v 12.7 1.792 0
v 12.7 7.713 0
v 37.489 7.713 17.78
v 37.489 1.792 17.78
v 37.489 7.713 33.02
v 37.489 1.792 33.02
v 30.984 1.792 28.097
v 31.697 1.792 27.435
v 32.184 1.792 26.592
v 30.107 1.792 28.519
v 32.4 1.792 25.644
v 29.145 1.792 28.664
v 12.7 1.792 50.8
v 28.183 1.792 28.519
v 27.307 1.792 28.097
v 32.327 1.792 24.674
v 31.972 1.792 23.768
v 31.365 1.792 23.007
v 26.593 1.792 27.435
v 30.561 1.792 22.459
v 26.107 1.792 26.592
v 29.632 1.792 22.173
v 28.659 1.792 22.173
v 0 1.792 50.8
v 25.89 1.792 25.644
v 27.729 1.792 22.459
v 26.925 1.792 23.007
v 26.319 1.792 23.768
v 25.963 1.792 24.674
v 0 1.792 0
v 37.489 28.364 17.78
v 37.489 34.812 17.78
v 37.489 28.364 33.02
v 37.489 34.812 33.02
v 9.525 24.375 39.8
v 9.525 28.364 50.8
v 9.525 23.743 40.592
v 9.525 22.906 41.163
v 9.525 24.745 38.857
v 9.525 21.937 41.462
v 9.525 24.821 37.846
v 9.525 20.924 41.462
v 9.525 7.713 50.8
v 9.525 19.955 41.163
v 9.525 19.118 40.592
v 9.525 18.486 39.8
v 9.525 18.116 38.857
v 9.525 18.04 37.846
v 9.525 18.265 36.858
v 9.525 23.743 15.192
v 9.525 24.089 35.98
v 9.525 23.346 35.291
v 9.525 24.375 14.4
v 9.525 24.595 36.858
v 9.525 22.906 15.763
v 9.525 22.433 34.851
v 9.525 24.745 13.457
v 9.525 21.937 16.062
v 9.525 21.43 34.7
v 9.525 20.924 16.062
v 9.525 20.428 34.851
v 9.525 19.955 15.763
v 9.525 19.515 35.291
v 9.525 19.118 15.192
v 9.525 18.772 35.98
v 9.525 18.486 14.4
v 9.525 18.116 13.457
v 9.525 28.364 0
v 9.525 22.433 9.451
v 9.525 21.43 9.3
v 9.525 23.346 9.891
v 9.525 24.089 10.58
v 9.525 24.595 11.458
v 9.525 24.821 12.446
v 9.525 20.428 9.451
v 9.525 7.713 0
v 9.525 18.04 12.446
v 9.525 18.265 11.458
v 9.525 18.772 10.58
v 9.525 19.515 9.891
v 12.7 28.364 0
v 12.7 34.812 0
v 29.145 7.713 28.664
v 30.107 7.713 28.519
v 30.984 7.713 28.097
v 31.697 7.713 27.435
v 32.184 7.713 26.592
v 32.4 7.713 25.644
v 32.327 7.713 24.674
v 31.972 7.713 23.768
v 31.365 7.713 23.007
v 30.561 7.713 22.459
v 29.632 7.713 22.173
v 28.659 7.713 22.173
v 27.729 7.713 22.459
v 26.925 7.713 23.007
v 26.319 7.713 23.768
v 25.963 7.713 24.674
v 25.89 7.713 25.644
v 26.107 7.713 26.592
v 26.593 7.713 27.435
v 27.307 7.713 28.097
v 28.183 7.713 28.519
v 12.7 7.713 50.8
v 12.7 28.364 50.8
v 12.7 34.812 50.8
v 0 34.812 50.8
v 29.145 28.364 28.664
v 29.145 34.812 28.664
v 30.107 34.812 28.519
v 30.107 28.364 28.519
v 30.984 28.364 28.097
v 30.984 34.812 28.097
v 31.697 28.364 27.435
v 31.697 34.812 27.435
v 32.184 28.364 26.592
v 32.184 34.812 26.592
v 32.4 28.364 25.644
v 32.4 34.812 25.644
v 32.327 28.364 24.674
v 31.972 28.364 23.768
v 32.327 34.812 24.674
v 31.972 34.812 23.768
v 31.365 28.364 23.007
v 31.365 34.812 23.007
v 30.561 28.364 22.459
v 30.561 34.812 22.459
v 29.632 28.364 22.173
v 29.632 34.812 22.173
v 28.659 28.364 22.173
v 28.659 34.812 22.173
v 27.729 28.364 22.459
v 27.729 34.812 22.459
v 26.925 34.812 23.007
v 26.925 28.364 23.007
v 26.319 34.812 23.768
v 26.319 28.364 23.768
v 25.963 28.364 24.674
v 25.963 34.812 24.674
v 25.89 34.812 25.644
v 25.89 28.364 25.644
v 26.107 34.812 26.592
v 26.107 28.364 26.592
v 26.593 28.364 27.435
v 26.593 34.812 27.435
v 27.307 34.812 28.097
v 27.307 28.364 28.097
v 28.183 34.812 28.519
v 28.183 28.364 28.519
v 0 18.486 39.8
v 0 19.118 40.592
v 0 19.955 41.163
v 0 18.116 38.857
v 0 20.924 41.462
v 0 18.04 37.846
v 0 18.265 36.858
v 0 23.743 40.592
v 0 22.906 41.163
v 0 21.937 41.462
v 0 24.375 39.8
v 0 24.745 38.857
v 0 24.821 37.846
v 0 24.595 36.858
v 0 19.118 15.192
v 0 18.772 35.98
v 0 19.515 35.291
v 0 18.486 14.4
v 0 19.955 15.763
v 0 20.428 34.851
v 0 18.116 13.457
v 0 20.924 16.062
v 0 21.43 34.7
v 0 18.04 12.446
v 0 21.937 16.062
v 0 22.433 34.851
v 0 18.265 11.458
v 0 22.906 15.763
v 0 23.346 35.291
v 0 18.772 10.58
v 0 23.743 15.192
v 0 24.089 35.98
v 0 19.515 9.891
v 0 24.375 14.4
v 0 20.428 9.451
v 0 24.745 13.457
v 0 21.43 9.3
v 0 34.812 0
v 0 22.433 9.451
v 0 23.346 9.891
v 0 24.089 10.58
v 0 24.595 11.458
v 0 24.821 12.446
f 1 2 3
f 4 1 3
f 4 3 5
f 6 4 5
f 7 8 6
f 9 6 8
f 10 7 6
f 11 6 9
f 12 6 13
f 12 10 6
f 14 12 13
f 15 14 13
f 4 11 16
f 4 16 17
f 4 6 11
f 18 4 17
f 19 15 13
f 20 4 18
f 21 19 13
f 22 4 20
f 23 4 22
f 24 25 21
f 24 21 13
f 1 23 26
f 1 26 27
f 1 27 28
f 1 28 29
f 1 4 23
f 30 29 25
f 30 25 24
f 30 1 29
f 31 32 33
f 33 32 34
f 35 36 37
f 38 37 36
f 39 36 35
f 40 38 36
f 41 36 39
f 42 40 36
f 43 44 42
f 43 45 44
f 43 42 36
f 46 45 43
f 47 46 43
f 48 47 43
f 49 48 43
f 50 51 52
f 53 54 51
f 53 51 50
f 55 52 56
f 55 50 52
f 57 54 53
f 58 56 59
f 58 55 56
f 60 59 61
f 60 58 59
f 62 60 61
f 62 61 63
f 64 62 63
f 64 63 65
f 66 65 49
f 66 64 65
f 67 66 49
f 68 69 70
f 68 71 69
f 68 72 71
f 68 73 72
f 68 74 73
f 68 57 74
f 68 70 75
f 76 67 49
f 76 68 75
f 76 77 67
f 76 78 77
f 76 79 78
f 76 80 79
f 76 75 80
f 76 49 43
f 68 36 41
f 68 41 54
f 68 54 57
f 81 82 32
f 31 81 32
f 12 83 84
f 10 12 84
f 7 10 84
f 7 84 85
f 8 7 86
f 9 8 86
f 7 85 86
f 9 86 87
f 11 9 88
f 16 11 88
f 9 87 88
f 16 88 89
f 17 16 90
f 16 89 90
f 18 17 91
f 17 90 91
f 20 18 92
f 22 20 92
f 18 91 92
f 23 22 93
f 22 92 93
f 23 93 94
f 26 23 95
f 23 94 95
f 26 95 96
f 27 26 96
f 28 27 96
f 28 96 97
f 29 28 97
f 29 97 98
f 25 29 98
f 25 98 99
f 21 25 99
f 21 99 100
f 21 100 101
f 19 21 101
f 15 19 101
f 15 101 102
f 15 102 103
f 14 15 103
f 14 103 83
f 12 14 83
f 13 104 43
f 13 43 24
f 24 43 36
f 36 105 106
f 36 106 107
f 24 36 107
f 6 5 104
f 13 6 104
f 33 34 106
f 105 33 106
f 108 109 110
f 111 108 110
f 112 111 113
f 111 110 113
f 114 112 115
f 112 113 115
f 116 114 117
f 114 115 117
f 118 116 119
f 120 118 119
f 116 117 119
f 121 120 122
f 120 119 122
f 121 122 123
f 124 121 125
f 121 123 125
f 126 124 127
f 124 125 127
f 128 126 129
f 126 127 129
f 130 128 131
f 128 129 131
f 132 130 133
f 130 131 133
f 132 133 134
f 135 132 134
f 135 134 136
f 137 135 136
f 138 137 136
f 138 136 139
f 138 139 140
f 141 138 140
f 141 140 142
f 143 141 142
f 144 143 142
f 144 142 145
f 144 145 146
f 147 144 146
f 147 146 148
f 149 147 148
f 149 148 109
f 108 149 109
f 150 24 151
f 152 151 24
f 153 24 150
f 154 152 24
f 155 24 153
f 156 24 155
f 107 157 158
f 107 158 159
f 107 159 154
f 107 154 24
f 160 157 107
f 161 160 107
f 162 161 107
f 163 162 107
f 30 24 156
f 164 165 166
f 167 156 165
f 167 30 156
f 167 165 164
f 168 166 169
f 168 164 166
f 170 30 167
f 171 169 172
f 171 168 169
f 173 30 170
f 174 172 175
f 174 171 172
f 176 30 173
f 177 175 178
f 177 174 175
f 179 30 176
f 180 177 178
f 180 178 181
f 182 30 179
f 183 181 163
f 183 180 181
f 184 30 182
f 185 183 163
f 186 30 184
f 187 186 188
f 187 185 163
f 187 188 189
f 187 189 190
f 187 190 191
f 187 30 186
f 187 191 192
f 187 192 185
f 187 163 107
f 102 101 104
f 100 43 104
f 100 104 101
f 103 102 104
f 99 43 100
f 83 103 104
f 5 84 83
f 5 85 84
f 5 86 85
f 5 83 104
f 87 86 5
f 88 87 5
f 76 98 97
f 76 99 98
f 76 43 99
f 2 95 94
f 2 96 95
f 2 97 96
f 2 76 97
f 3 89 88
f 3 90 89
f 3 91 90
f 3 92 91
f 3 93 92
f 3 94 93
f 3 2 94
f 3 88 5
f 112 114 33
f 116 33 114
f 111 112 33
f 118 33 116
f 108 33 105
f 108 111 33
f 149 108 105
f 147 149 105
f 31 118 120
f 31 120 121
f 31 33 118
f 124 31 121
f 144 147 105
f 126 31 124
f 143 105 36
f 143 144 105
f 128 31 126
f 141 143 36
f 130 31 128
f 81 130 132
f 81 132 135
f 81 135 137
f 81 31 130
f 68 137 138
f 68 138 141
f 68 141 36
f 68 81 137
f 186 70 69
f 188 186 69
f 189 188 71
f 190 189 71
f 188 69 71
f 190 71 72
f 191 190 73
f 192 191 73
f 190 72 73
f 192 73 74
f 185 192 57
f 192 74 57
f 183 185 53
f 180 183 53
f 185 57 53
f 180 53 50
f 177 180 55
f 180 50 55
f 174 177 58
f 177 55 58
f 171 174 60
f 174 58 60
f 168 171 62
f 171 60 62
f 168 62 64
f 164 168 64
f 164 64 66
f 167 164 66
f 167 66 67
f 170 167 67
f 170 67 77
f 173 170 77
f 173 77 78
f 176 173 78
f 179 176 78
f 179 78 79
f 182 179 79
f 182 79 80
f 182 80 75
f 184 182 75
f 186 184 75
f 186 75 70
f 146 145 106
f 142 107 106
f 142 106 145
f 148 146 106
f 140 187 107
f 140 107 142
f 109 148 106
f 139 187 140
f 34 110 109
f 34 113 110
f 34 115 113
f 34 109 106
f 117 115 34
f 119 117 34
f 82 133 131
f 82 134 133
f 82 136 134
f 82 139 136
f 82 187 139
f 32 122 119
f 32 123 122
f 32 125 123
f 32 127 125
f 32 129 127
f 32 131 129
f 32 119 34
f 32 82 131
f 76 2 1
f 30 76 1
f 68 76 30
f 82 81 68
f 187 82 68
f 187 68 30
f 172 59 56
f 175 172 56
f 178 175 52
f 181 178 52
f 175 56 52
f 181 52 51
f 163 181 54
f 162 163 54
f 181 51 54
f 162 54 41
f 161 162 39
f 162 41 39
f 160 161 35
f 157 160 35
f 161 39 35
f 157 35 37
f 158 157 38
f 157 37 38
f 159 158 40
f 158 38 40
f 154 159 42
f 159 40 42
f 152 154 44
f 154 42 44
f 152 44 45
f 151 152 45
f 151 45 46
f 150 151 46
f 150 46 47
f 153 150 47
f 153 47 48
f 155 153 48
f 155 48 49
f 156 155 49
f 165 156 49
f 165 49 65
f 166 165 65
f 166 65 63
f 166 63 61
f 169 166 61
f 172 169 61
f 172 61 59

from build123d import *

# Parameters (mm, degrees)
BOSS_EXTRUDE1_DEPTH          = 50.8
SKETCH2_R                    = 3.4
M8X1_25_THREADED_HOLES_DEPTH = 50.8
CUT_EXTRUDE2_REACH           = 75.634
SKETCH3_R                    = 3.2639


with BuildPart() as part:
    # Sketch1 → Boss-Extrude1 (new body)
    with BuildSketch(Plane.XY):
        Polygon((0, 1.791647537), (0, 34.811647537), (41.845257966, 34.811647537), (41.845257966, 28.3636723), (9.525, 28.3636723), (9.525, 7.7134723), (41.845257966, 7.7134723), (41.845257966, 1.791647537), align=None)
    extrude(amount=BOSS_EXTRUDE1_DEPTH)

    # Sketch2 → M8x1.25 Threaded Holes (cut)
    with BuildSketch(Plane(origin=(9.525, 0, 0), x_dir=(0, 0, -1), z_dir=(1, 0, 0))):
        with Locations((-38.1, 21.430460881)):
            Circle(SKETCH2_R)
        with Locations((-12.7, 21.430460881)):
            Circle(SKETCH2_R)
    extrude(amount=-M8X1_25_THREADED_HOLES_DEPTH, mode=Mode.SUBTRACT)

    # Cut-Extrude2: up to this face of the body (flat: up to its plane)
    cut_extrude2_end = Plane(part.part.faces().sort_by_distance((20.922628983, 1.791647537, 25.4))[0])
    # Sketch3 → Cut-Extrude2 (cut, up to the picked face)
    with BuildSketch(Plane(origin=(0, 34.811647537, 0), x_dir=(1, 0, 0), z_dir=(0, 1, 0)), mode=Mode.PRIVATE) as cut_extrude2_sk1:
        with Locations(Location((29.145257966, -25.4, 0), (0, 0, 270))):
            Circle(SKETCH3_R)
    cut_extrude2_tool1 = split(extrude(cut_extrude2_sk1.sketch, amount=-CUT_EXTRUDE2_REACH, mode=Mode.PRIVATE), bisect_by=cut_extrude2_end, keep=Keep.BOTH, mode=Mode.PRIVATE)
    # Sketch3 → Cut-Extrude2 (cut, up to the picked face)
    with BuildSketch(Plane(origin=(0, 34.811647537, 0), x_dir=(1, 0, 0), z_dir=(0, 1, 0)), mode=Mode.PRIVATE) as cut_extrude2_sk2:
        Polygon((12.7, 0), (37.489157966, -17.78), (37.489157966, -33.02), (12.7, -50.8), (41.845257966, -50.8), (41.845257966, 0), align=None)
    cut_extrude2_tool2 = split(extrude(cut_extrude2_sk2.sketch, amount=-CUT_EXTRUDE2_REACH, mode=Mode.PRIVATE), bisect_by=cut_extrude2_end, keep=Keep.BOTH, mode=Mode.PRIVATE)
    add(cut_extrude2_tool1.solids().sort_by(Axis((29.145258, 34.811648, 25.4), (0, -1, 0)))[0], mode=Mode.SUBTRACT)
    add(cut_extrude2_tool2.solids().sort_by(Axis((25.435926, 34.811648, 8.414089), (0, -1, 0)))[0], mode=Mode.SUBTRACT)


solid = part.part
